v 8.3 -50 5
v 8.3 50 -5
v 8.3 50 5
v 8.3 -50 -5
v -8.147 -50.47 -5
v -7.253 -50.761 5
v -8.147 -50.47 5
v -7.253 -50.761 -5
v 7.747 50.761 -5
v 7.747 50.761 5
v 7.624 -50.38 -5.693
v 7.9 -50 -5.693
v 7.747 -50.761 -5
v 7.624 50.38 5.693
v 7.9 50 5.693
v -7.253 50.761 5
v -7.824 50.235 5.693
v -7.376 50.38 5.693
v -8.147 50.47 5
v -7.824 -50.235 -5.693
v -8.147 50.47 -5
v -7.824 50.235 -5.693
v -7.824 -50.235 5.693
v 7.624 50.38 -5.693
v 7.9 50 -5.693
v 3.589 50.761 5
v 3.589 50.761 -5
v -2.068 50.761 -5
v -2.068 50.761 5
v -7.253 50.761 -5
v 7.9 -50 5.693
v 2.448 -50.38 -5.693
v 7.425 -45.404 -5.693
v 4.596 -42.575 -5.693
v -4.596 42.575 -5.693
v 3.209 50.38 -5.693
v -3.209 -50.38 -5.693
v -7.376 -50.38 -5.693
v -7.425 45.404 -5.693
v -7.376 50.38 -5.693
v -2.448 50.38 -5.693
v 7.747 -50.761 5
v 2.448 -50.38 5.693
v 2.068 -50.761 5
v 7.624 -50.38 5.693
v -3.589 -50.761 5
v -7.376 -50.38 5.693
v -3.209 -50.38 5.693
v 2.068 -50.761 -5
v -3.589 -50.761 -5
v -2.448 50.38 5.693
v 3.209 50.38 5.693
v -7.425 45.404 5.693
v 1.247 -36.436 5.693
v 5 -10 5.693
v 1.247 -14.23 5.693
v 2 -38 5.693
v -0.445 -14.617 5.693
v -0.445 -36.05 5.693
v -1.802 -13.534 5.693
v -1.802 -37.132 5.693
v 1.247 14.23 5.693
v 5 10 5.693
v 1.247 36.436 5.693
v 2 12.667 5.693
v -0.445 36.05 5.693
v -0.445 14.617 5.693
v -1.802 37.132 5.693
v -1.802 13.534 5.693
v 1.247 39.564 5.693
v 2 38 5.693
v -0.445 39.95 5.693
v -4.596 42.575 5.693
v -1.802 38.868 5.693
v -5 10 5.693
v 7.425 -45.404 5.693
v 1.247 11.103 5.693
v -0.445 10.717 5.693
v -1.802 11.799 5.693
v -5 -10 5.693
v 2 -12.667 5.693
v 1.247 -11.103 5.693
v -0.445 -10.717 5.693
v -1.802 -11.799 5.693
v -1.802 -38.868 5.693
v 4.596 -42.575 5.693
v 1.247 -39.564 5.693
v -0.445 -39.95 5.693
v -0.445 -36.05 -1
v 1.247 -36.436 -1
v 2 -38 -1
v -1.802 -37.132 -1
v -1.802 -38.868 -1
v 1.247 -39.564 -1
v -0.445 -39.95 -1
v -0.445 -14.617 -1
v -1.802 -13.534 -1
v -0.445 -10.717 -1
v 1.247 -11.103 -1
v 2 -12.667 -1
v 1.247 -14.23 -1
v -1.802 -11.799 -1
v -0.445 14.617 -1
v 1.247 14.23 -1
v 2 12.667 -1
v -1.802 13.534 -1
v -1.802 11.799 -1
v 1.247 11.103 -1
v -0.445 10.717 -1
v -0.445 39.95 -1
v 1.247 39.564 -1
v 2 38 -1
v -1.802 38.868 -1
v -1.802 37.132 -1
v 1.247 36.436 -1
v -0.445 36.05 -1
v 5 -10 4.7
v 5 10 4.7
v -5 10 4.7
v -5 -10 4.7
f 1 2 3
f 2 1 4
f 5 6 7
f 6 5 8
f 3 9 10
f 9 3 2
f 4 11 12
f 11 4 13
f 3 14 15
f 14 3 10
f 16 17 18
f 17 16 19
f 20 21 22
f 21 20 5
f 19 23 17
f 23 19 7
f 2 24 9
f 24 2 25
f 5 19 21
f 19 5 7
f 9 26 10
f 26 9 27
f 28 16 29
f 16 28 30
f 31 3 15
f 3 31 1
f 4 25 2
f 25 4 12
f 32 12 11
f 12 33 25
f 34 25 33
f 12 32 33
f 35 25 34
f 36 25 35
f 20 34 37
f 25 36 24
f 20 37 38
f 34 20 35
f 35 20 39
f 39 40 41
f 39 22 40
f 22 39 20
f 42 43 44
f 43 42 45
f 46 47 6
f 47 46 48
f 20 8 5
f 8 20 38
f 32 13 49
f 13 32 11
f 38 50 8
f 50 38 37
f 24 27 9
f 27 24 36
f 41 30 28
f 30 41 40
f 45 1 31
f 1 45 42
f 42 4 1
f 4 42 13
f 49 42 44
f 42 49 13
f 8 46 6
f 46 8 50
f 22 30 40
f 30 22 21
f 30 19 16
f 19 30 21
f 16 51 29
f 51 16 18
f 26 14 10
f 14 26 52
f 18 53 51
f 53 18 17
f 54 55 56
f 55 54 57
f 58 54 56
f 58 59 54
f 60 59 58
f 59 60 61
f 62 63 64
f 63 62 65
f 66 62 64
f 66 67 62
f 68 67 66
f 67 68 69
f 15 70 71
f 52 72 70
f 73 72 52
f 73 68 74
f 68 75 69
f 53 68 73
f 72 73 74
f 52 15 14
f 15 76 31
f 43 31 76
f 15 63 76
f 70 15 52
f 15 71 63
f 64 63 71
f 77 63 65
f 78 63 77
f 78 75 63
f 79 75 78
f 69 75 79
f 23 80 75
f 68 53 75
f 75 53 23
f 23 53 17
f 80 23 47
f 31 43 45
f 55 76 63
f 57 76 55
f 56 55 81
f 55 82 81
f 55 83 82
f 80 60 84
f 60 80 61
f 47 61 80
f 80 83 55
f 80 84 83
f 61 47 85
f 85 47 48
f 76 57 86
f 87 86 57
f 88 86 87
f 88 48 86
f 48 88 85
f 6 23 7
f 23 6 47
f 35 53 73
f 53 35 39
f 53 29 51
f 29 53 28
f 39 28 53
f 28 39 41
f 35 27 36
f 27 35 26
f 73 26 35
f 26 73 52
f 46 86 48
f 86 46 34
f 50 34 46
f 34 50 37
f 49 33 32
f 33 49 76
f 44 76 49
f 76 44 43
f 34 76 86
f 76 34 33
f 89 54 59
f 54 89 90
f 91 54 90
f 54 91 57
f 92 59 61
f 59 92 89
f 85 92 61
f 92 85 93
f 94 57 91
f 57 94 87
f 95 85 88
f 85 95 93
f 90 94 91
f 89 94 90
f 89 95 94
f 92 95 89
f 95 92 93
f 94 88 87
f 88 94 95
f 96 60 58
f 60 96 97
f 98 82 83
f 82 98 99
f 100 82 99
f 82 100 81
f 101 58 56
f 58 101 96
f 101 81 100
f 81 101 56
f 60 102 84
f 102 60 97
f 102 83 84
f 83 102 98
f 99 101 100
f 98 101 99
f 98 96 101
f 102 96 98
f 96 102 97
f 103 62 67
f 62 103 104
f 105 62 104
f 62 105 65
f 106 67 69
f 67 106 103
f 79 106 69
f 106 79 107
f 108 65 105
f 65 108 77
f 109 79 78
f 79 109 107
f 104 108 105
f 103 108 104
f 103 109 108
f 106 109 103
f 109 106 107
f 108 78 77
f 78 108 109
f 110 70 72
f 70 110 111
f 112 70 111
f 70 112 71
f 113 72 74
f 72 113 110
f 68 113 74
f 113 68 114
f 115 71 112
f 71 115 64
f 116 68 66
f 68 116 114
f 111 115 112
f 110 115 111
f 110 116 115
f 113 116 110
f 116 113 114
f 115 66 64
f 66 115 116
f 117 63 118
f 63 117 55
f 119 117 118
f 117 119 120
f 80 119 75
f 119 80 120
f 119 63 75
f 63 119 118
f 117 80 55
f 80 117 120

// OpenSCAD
// Parameters
rail_L = 100; //[50:200:1]
rail_W = 15; //[8:30:0.5]
rail_H = 10; //[5:20:0.5]
overlap = 1; //[0.5:2:0.1]
hole_d = 4; //[2:8:0.5]
hole_count = 4; //[2:8:1]
hole_edge_margin = 12; //[6:24:1]
hole_depth = 6; //[2:10:0.5]
chamfer_len = 2; //[0.5:5:0.5]
fillet_r = 0.8; //[0.2:2:0.1]
mark_depth = 0.3; //[0.1:1:0.1]
mark_W = 10; //[5:20:0.5]
mark_L = 20; //[8:40:1]

// Rail Body with Fillets
module rail_body_fillet() {
  minkowski() {
    cube([rail_W, rail_L, rail_H], center=true);
    sphere(r=fillet_r);
  }
}

// End Chamfers
module end_chamfers() {
  difference() {
    rail_body_fillet();
    translate([0, rail_L/2 - chamfer_len/2 + overlap, 0])
      rotate([0, 0, 45])
      cube([rail_W + 2*overlap, chamfer_len + 2*overlap, rail_H + 2*overlap], center=true);
    translate([0, -rail_L/2 + chamfer_len/2 - overlap, 0])
      rotate([0, 0, 45])
      cube([rail_W + 2*overlap, chamfer_len + 2*overlap, rail_H + 2*overlap], center=true);
  }
}

// Mounting Holes
module mounting_holes() {
  union() {
    for (i = [0:hole_count-1]) {
      translate([0, -rail_L/2 + hole_edge_margin + i*(rail_L - 2*hole_edge_margin)/(hole_count - 1), rail_H/2 - hole_depth/2 + overlap])
        cylinder(h=hole_depth + 2*overlap, r=hole_d/2, center=true);
    }
  }
}

// Engraved Markings
module engraved_markings() {
  translate([0, 0, rail_H/2 - mark_depth/2 + overlap])
    cube([mark_W, mark_L, mark_depth + 2*overlap], center=true);
}

// Complete Model
difference() {
  end_chamfers();
  mounting_holes();
  engraved_markings();
}
